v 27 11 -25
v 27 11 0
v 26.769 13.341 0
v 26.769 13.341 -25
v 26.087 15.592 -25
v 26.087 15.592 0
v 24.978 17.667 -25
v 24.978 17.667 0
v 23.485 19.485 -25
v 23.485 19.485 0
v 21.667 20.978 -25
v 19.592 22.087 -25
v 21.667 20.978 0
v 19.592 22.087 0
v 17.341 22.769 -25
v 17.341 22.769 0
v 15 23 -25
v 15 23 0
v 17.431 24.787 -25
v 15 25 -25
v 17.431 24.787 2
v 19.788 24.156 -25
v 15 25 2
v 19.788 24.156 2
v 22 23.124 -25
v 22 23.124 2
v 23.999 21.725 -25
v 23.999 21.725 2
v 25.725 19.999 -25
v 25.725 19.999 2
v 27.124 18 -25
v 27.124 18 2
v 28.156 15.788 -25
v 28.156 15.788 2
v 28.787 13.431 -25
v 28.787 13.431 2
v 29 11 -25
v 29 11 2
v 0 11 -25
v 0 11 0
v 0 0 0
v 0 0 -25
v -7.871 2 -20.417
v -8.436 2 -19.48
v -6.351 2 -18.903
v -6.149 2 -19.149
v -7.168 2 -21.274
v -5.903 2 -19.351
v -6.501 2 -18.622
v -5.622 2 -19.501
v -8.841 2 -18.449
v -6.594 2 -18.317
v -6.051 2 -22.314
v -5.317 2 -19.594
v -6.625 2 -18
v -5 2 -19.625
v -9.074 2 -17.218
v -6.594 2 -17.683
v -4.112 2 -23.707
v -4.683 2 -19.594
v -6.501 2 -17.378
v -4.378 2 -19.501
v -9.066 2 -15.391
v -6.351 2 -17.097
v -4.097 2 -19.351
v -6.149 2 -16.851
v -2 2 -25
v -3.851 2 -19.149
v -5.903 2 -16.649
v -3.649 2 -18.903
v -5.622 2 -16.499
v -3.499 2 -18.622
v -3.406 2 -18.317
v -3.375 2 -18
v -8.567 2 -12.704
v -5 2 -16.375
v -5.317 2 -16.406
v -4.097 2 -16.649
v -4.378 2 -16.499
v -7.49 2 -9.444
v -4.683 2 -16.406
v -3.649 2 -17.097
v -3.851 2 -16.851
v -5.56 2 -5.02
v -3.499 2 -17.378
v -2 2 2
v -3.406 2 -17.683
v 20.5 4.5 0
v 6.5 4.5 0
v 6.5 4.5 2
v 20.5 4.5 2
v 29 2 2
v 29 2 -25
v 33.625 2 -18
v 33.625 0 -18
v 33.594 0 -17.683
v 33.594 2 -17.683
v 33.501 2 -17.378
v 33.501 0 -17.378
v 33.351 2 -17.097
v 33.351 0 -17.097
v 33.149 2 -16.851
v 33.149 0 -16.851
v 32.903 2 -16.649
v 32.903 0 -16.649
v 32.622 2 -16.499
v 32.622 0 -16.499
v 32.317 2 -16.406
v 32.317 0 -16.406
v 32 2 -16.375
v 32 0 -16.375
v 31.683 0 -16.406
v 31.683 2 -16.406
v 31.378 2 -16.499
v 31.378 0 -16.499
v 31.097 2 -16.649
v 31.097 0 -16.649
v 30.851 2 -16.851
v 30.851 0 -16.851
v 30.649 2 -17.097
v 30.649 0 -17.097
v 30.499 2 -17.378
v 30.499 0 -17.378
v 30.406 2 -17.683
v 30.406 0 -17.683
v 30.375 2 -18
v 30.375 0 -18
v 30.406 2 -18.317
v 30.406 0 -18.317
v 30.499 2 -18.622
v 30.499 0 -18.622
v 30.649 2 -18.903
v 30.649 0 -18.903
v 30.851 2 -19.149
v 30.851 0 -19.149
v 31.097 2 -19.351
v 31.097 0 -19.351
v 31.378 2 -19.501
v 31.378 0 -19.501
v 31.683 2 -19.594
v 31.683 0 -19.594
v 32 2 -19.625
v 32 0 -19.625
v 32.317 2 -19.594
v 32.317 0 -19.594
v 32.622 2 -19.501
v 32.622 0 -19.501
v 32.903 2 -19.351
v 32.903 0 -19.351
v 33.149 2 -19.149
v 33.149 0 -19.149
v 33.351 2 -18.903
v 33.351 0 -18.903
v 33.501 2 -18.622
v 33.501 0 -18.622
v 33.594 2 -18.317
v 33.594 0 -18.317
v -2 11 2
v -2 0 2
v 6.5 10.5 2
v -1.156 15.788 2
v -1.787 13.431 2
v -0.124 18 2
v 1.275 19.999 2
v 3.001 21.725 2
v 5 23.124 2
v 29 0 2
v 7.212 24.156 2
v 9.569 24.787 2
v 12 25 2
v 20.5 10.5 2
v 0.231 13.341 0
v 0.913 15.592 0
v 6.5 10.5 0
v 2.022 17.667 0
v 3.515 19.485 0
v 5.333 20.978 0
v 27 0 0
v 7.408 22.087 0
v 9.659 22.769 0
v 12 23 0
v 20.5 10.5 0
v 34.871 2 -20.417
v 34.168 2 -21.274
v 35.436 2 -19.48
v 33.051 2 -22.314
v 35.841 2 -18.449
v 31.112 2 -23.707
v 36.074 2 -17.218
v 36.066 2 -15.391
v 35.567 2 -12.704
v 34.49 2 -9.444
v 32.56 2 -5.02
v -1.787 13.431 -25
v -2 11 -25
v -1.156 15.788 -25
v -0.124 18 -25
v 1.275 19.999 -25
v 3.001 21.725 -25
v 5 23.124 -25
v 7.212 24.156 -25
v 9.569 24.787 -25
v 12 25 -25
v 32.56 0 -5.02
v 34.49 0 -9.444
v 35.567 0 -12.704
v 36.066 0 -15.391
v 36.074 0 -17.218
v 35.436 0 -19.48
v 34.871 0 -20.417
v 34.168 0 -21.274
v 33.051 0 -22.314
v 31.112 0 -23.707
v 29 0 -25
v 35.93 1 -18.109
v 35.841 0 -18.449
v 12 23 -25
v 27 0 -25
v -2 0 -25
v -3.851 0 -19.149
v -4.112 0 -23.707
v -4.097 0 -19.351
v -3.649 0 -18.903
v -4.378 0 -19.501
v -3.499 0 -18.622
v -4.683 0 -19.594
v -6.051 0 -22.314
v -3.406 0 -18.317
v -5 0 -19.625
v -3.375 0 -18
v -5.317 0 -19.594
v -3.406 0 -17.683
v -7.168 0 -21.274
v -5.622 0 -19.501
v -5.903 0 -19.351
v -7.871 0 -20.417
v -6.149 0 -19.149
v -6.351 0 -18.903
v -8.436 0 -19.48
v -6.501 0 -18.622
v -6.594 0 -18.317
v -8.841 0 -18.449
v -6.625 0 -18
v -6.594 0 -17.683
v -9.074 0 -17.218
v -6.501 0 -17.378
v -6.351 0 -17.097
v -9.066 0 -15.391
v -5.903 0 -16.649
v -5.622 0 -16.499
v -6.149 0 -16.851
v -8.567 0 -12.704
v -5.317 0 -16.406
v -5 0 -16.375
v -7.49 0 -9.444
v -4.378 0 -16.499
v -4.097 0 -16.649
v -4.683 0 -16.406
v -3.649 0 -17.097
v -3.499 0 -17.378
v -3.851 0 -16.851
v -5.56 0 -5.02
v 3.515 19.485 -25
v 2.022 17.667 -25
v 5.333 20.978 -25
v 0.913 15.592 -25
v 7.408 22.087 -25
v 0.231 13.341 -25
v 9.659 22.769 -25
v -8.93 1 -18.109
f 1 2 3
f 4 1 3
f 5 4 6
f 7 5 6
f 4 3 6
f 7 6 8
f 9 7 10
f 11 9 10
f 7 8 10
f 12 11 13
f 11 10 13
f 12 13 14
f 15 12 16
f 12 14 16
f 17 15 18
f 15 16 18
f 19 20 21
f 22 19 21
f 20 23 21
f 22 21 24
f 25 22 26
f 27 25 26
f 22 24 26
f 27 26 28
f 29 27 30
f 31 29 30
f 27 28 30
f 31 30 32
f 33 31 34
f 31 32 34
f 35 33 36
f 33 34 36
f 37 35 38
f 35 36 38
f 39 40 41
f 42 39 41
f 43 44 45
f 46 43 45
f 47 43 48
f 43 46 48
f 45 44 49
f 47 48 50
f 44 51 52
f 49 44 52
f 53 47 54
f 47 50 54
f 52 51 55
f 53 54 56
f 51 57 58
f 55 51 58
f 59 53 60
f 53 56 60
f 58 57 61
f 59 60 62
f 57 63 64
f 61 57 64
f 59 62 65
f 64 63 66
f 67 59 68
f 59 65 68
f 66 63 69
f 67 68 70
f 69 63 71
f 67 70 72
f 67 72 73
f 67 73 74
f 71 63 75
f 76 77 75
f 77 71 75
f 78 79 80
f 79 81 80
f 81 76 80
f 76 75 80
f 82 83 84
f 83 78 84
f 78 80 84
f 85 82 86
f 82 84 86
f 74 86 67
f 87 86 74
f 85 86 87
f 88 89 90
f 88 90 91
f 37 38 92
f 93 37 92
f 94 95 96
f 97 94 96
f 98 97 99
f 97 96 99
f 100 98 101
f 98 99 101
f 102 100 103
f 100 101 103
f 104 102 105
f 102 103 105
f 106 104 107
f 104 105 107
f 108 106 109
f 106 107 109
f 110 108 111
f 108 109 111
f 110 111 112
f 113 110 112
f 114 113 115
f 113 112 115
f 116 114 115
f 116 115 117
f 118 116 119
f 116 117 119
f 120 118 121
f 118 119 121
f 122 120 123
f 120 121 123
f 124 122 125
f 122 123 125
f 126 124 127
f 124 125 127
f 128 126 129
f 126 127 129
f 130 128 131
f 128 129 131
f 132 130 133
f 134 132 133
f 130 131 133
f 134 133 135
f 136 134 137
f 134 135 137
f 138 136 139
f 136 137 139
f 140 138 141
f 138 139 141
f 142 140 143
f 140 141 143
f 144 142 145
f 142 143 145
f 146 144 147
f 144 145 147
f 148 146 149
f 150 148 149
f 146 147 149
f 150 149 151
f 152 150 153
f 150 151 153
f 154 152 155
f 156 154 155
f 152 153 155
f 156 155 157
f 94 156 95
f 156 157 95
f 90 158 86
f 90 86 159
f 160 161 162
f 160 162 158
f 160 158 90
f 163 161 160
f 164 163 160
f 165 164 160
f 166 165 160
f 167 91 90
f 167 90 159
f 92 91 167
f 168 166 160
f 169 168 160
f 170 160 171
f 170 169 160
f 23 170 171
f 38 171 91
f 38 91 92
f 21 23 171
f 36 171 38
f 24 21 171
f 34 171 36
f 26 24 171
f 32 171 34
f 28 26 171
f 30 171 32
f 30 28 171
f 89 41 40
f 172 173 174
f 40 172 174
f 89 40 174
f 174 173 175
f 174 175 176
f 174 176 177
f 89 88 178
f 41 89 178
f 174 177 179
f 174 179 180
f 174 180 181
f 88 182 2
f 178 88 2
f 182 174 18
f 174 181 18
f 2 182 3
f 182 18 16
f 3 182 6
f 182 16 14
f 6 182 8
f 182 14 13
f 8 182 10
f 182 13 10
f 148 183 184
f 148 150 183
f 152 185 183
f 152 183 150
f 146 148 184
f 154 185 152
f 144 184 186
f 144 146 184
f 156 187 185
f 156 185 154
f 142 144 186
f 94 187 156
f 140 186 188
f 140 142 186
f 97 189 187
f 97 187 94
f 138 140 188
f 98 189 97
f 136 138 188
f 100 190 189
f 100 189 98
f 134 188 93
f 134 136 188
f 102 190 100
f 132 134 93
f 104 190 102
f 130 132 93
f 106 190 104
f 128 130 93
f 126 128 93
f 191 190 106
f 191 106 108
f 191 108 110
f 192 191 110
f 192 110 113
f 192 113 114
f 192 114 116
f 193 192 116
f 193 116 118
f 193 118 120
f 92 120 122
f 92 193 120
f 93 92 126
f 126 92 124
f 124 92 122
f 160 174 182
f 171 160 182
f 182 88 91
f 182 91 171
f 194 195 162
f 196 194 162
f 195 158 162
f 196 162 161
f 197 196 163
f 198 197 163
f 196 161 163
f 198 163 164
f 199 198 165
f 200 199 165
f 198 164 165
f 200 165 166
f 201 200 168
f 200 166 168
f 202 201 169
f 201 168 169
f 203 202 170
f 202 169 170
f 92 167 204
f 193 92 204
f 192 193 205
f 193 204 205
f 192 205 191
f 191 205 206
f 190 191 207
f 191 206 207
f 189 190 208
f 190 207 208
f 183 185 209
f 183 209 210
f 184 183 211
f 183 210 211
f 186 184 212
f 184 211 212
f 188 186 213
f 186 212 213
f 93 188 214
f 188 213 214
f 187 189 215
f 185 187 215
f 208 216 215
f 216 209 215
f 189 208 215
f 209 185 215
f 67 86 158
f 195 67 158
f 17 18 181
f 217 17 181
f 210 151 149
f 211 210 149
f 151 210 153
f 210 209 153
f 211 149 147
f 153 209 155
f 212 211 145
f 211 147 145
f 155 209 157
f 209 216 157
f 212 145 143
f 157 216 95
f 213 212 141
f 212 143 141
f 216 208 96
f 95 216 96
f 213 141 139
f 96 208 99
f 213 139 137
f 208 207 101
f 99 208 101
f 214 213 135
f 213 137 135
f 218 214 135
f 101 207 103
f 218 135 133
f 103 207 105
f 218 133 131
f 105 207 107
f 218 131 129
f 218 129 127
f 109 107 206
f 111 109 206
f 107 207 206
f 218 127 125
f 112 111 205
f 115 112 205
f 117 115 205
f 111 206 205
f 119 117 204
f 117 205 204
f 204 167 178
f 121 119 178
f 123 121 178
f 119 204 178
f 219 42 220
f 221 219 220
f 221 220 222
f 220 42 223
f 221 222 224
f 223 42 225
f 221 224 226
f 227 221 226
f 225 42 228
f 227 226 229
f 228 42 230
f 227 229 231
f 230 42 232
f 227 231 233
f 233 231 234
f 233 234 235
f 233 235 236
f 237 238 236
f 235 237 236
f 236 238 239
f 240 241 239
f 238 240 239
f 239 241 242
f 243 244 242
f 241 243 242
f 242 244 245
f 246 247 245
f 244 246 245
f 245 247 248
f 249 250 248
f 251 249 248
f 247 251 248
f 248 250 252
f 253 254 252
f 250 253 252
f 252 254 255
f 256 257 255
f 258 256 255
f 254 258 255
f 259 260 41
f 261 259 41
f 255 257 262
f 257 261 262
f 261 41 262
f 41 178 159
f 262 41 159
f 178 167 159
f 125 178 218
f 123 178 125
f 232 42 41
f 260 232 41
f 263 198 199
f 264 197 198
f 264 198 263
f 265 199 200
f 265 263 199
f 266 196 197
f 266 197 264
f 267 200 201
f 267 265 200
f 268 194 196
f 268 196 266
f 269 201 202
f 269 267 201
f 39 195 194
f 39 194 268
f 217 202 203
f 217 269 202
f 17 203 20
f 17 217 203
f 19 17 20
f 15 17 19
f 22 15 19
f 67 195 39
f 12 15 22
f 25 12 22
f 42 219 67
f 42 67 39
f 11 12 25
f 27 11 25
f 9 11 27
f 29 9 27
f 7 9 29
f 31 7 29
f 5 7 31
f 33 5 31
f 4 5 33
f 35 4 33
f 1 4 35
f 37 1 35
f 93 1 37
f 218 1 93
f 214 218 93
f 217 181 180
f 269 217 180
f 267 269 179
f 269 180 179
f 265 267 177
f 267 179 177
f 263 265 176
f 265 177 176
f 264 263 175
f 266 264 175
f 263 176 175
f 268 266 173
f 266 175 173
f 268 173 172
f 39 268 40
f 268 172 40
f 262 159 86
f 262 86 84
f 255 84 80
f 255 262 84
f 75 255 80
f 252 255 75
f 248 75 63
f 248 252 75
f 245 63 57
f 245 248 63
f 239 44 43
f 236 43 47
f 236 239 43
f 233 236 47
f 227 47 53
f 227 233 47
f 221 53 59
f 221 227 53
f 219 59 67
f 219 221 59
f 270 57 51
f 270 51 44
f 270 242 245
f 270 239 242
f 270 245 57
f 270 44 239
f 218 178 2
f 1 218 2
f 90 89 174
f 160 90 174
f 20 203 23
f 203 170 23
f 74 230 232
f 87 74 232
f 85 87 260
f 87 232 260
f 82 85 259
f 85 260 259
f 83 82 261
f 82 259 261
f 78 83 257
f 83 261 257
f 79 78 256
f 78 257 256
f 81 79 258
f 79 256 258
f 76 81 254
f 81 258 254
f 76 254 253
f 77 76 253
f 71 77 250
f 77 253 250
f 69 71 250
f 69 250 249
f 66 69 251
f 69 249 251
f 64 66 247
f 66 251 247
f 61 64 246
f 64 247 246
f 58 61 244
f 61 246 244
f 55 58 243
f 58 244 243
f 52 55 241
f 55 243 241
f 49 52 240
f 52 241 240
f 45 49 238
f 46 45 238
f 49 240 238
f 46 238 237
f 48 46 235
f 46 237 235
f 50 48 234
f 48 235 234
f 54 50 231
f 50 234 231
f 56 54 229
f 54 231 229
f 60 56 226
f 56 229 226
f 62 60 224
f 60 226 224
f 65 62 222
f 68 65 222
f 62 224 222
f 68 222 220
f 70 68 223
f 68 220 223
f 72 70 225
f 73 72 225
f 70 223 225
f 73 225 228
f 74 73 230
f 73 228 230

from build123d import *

# Parameters (mm, degrees)
F0_W     = 14
F0_H     = 6
F1_DEPTH = 2
F3_DEPTH = 25
F4_R     = 1.625
F5_DEPTH = 2


with BuildPart() as f1:
    # F0 (on Top) → F1 (new body)
    with BuildSketch(Plane.XY):
        with BuildLine():
            ThreePointArc((0, 11), (3.5147186258, 19.4852813742), (12, 23))
            Line((12, 23), (15, 23))
            ThreePointArc((15, 23), (23.4852813742, 19.4852813742), (27, 11))
            Line((27, 11), (27, 5))
            Line((27, 5), (27, 0))
            Line((27, 0), (29, 0))
            Line((29, 0), (29, 5))
            Line((29, 5), (29, 11))
            ThreePointArc((29, 11), (24.8994949366, 20.8994949366), (15, 25))
            Line((15, 25), (12, 25))
            ThreePointArc((12, 25), (2.1005050634, 20.8994949366), (-2, 11))
            Line((-2, 11), (-2, 5))
            Line((-2, 5), (-2, 0))
            Line((-2, 0), (0, 0))
            Line((0, 0), (0, 5))
            Line((0, 5), (0, 11))
        make_face()
        with BuildLine():
            Line((15, 23), (12, 23))
            ThreePointArc((12, 23), (3.5147186258, 19.4852813742), (0, 11))
            Line((0, 11), (0, 5))
            Line((0, 5), (0, 0))
            Line((0, 0), (27, 0))
            Line((27, 0), (27, 5))
            Line((27, 5), (27, 11))
            ThreePointArc((27, 11), (23.4852813742, 19.4852813742), (15, 23))
        make_face()
        with Locations((13.5, 7.5)):
            Rectangle(F0_W, F0_H, mode=Mode.SUBTRACT)
    extrude(amount=F1_DEPTH)

    # F2 (on face) → F3 (join)
    with BuildSketch(Plane(origin=(0, 0, 0), x_dir=(1, 0, 0), z_dir=(0, 0, -1))):
        with BuildLine():
            Line((0, -11), (0, 0))
            Line((0, 0), (-2, 0))
            Line((-2, 0), (-2, -11))
            ThreePointArc((-2, -11), (2.1005050634, -20.8994949366), (12, -25))
            Line((12, -25), (15, -25))
            ThreePointArc((15, -25), (24.8994949366, -20.8994949366), (29, -11))
            Line((29, -11), (29, 0))
            Line((29, 0), (27, 0))
            Line((27, 0), (27, -11))
            ThreePointArc((27, -11), (23.4852813742, -19.4852813742), (15, -23))
            Line((15, -23), (12, -23))
            ThreePointArc((12, -23), (3.5147186258, -19.4852813742), (0, -11))
        make_face()
    extrude(amount=F3_DEPTH)

    # F4 (on face) → F5 (join)
    with BuildSketch(Plane.XZ):
        with BuildLine():
            add(Edge.make_bspline(
                [(29, 2), (33.0137730771, -5.6907851712), (39.7482218864, -18.594653438), (32.0927595214, -23.1568861551), (29, -25)],
                knots=[0, 0, 0, 0, 0.5960061752, 1, 1, 1, 1], degree=3))
            Line((29, 2), (29, -25))
        make_face()
        with Locations((32, -18)):
            Circle(F4_R, mode=Mode.SUBTRACT)
        with BuildLine():
            Line((-2, -25), (-2, 2))
            add(Edge.make_bspline(
                [(-2, 2), (-6.0137730771, -5.6907851712), (-12.7482218864, -18.594653438), (-5.0927595214, -23.1568861551), (-2, -25)],
                knots=[0, 0, 0, 0, 0.5960061752, 1, 1, 1, 1], degree=3))
        make_face()
        with Locations((-5, -18)):
            Circle(F4_R, mode=Mode.SUBTRACT)
    extrude(amount=-F5_DEPTH)


solid = f1.part
